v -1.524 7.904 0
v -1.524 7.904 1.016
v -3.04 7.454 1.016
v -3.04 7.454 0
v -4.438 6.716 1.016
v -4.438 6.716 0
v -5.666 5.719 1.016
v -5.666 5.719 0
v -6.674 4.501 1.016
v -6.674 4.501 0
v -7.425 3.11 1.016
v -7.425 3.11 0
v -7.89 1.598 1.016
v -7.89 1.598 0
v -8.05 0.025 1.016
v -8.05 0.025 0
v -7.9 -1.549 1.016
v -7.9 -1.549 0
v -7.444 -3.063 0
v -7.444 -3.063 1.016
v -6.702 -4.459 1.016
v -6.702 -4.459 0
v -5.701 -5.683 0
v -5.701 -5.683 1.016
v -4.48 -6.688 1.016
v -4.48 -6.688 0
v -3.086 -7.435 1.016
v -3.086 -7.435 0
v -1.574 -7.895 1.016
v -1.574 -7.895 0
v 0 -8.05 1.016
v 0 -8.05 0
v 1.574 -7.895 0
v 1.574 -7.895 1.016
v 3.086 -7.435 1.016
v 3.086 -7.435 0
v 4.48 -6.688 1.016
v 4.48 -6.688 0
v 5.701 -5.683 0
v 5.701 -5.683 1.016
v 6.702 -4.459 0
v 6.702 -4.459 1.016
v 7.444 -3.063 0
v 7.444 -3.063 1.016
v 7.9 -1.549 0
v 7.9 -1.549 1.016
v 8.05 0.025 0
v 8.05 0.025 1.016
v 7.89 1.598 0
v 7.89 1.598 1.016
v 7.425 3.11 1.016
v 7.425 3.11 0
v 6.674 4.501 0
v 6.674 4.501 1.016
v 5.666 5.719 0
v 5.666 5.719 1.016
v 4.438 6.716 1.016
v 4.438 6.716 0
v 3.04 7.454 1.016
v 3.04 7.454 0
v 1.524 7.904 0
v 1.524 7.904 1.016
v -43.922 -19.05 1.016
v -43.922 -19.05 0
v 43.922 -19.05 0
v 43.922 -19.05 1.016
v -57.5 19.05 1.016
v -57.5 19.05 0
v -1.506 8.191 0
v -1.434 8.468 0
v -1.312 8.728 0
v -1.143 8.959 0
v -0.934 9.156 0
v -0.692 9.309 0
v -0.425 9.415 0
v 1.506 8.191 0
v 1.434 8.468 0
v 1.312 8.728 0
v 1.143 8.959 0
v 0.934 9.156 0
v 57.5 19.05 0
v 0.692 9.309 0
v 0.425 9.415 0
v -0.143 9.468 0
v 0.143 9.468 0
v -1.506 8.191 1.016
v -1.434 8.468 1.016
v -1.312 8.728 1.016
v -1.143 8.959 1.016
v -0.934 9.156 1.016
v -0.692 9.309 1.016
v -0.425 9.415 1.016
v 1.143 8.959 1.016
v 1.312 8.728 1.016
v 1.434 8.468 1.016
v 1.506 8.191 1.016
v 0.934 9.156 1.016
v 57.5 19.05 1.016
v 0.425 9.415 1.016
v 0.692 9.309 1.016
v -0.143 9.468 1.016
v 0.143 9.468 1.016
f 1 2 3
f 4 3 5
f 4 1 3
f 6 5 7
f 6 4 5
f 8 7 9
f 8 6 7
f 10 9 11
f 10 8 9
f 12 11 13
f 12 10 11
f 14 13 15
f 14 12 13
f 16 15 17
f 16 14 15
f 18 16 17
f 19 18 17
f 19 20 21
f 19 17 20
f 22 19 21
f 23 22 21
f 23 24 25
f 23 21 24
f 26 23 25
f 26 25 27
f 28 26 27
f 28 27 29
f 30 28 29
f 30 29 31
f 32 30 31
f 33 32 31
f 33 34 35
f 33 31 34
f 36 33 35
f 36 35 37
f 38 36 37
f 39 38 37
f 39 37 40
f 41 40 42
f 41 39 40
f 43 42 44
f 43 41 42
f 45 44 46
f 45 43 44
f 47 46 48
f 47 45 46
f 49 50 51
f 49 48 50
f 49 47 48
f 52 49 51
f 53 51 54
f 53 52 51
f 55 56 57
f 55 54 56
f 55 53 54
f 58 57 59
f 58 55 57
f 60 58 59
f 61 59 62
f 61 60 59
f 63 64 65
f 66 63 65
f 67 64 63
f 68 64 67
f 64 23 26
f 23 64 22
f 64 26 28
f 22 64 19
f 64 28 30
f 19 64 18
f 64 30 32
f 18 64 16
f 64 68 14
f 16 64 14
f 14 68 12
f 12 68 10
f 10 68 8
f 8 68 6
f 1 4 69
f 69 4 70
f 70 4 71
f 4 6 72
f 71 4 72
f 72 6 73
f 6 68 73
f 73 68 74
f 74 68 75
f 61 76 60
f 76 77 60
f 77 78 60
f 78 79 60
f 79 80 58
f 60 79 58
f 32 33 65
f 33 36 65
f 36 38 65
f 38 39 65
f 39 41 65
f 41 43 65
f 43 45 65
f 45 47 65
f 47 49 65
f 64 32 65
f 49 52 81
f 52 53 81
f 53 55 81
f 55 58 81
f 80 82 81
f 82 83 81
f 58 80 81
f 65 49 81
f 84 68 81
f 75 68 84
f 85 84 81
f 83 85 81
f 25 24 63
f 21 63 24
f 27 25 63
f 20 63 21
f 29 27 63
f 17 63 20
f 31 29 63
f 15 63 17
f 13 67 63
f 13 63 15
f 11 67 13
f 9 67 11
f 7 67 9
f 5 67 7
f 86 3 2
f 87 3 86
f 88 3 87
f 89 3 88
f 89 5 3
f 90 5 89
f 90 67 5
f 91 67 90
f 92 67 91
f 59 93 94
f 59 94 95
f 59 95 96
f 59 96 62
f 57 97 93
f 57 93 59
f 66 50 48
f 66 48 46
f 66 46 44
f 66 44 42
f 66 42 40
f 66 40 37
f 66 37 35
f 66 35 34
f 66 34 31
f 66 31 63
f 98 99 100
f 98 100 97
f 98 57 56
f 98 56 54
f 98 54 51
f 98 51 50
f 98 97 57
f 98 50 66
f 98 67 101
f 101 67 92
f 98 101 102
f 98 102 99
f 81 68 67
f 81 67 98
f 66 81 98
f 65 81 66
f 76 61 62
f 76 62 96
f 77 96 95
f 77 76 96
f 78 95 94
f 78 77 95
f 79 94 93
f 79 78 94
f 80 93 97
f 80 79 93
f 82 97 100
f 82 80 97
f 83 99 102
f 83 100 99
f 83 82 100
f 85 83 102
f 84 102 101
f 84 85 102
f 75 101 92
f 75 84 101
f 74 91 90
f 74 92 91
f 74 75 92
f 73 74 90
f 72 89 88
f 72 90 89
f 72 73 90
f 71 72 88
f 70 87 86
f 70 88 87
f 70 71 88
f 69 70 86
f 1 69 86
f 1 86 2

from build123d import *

# Parameters (mm, degrees)
SKETCH1_W           = 115
SKETCH1_H           = 38.1
BOSS_EXTRUDE1_DEPTH = 1.016
CUT_EXTRUDE2_DEPTH  = 61.582049784


with BuildPart() as part:
    # Sketch1 → Boss-Extrude1 (new body)
    with BuildSketch(Plane.XY):
        Rectangle(SKETCH1_W, SKETCH1_H)
    extrude(amount=BOSS_EXTRUDE1_DEPTH)

    # Sketch2 → Cut-Extrude2 (cut, through all)
    with BuildSketch(Plane.XY):
        Polygon((-57.5, 19.05), (-57.5, -19.05), (-43.921959921, -19.05), align=None)
        Polygon((57.5, -19.05), (57.5, 19.05), (43.921959921, -19.05), align=None)
        with BuildLine():
            ThreePointArc((-1.524320269, 7.904362604), (0, -8.050000029), (1.524320269, 7.904362604))
            ThreePointArc((1.524320269, 7.904362604), (0, 9.475003402), (-1.524320269, 7.904362604))
        make_face()
    extrude(amount=CUT_EXTRUDE2_DEPTH, mode=Mode.SUBTRACT)


solid = part.part
